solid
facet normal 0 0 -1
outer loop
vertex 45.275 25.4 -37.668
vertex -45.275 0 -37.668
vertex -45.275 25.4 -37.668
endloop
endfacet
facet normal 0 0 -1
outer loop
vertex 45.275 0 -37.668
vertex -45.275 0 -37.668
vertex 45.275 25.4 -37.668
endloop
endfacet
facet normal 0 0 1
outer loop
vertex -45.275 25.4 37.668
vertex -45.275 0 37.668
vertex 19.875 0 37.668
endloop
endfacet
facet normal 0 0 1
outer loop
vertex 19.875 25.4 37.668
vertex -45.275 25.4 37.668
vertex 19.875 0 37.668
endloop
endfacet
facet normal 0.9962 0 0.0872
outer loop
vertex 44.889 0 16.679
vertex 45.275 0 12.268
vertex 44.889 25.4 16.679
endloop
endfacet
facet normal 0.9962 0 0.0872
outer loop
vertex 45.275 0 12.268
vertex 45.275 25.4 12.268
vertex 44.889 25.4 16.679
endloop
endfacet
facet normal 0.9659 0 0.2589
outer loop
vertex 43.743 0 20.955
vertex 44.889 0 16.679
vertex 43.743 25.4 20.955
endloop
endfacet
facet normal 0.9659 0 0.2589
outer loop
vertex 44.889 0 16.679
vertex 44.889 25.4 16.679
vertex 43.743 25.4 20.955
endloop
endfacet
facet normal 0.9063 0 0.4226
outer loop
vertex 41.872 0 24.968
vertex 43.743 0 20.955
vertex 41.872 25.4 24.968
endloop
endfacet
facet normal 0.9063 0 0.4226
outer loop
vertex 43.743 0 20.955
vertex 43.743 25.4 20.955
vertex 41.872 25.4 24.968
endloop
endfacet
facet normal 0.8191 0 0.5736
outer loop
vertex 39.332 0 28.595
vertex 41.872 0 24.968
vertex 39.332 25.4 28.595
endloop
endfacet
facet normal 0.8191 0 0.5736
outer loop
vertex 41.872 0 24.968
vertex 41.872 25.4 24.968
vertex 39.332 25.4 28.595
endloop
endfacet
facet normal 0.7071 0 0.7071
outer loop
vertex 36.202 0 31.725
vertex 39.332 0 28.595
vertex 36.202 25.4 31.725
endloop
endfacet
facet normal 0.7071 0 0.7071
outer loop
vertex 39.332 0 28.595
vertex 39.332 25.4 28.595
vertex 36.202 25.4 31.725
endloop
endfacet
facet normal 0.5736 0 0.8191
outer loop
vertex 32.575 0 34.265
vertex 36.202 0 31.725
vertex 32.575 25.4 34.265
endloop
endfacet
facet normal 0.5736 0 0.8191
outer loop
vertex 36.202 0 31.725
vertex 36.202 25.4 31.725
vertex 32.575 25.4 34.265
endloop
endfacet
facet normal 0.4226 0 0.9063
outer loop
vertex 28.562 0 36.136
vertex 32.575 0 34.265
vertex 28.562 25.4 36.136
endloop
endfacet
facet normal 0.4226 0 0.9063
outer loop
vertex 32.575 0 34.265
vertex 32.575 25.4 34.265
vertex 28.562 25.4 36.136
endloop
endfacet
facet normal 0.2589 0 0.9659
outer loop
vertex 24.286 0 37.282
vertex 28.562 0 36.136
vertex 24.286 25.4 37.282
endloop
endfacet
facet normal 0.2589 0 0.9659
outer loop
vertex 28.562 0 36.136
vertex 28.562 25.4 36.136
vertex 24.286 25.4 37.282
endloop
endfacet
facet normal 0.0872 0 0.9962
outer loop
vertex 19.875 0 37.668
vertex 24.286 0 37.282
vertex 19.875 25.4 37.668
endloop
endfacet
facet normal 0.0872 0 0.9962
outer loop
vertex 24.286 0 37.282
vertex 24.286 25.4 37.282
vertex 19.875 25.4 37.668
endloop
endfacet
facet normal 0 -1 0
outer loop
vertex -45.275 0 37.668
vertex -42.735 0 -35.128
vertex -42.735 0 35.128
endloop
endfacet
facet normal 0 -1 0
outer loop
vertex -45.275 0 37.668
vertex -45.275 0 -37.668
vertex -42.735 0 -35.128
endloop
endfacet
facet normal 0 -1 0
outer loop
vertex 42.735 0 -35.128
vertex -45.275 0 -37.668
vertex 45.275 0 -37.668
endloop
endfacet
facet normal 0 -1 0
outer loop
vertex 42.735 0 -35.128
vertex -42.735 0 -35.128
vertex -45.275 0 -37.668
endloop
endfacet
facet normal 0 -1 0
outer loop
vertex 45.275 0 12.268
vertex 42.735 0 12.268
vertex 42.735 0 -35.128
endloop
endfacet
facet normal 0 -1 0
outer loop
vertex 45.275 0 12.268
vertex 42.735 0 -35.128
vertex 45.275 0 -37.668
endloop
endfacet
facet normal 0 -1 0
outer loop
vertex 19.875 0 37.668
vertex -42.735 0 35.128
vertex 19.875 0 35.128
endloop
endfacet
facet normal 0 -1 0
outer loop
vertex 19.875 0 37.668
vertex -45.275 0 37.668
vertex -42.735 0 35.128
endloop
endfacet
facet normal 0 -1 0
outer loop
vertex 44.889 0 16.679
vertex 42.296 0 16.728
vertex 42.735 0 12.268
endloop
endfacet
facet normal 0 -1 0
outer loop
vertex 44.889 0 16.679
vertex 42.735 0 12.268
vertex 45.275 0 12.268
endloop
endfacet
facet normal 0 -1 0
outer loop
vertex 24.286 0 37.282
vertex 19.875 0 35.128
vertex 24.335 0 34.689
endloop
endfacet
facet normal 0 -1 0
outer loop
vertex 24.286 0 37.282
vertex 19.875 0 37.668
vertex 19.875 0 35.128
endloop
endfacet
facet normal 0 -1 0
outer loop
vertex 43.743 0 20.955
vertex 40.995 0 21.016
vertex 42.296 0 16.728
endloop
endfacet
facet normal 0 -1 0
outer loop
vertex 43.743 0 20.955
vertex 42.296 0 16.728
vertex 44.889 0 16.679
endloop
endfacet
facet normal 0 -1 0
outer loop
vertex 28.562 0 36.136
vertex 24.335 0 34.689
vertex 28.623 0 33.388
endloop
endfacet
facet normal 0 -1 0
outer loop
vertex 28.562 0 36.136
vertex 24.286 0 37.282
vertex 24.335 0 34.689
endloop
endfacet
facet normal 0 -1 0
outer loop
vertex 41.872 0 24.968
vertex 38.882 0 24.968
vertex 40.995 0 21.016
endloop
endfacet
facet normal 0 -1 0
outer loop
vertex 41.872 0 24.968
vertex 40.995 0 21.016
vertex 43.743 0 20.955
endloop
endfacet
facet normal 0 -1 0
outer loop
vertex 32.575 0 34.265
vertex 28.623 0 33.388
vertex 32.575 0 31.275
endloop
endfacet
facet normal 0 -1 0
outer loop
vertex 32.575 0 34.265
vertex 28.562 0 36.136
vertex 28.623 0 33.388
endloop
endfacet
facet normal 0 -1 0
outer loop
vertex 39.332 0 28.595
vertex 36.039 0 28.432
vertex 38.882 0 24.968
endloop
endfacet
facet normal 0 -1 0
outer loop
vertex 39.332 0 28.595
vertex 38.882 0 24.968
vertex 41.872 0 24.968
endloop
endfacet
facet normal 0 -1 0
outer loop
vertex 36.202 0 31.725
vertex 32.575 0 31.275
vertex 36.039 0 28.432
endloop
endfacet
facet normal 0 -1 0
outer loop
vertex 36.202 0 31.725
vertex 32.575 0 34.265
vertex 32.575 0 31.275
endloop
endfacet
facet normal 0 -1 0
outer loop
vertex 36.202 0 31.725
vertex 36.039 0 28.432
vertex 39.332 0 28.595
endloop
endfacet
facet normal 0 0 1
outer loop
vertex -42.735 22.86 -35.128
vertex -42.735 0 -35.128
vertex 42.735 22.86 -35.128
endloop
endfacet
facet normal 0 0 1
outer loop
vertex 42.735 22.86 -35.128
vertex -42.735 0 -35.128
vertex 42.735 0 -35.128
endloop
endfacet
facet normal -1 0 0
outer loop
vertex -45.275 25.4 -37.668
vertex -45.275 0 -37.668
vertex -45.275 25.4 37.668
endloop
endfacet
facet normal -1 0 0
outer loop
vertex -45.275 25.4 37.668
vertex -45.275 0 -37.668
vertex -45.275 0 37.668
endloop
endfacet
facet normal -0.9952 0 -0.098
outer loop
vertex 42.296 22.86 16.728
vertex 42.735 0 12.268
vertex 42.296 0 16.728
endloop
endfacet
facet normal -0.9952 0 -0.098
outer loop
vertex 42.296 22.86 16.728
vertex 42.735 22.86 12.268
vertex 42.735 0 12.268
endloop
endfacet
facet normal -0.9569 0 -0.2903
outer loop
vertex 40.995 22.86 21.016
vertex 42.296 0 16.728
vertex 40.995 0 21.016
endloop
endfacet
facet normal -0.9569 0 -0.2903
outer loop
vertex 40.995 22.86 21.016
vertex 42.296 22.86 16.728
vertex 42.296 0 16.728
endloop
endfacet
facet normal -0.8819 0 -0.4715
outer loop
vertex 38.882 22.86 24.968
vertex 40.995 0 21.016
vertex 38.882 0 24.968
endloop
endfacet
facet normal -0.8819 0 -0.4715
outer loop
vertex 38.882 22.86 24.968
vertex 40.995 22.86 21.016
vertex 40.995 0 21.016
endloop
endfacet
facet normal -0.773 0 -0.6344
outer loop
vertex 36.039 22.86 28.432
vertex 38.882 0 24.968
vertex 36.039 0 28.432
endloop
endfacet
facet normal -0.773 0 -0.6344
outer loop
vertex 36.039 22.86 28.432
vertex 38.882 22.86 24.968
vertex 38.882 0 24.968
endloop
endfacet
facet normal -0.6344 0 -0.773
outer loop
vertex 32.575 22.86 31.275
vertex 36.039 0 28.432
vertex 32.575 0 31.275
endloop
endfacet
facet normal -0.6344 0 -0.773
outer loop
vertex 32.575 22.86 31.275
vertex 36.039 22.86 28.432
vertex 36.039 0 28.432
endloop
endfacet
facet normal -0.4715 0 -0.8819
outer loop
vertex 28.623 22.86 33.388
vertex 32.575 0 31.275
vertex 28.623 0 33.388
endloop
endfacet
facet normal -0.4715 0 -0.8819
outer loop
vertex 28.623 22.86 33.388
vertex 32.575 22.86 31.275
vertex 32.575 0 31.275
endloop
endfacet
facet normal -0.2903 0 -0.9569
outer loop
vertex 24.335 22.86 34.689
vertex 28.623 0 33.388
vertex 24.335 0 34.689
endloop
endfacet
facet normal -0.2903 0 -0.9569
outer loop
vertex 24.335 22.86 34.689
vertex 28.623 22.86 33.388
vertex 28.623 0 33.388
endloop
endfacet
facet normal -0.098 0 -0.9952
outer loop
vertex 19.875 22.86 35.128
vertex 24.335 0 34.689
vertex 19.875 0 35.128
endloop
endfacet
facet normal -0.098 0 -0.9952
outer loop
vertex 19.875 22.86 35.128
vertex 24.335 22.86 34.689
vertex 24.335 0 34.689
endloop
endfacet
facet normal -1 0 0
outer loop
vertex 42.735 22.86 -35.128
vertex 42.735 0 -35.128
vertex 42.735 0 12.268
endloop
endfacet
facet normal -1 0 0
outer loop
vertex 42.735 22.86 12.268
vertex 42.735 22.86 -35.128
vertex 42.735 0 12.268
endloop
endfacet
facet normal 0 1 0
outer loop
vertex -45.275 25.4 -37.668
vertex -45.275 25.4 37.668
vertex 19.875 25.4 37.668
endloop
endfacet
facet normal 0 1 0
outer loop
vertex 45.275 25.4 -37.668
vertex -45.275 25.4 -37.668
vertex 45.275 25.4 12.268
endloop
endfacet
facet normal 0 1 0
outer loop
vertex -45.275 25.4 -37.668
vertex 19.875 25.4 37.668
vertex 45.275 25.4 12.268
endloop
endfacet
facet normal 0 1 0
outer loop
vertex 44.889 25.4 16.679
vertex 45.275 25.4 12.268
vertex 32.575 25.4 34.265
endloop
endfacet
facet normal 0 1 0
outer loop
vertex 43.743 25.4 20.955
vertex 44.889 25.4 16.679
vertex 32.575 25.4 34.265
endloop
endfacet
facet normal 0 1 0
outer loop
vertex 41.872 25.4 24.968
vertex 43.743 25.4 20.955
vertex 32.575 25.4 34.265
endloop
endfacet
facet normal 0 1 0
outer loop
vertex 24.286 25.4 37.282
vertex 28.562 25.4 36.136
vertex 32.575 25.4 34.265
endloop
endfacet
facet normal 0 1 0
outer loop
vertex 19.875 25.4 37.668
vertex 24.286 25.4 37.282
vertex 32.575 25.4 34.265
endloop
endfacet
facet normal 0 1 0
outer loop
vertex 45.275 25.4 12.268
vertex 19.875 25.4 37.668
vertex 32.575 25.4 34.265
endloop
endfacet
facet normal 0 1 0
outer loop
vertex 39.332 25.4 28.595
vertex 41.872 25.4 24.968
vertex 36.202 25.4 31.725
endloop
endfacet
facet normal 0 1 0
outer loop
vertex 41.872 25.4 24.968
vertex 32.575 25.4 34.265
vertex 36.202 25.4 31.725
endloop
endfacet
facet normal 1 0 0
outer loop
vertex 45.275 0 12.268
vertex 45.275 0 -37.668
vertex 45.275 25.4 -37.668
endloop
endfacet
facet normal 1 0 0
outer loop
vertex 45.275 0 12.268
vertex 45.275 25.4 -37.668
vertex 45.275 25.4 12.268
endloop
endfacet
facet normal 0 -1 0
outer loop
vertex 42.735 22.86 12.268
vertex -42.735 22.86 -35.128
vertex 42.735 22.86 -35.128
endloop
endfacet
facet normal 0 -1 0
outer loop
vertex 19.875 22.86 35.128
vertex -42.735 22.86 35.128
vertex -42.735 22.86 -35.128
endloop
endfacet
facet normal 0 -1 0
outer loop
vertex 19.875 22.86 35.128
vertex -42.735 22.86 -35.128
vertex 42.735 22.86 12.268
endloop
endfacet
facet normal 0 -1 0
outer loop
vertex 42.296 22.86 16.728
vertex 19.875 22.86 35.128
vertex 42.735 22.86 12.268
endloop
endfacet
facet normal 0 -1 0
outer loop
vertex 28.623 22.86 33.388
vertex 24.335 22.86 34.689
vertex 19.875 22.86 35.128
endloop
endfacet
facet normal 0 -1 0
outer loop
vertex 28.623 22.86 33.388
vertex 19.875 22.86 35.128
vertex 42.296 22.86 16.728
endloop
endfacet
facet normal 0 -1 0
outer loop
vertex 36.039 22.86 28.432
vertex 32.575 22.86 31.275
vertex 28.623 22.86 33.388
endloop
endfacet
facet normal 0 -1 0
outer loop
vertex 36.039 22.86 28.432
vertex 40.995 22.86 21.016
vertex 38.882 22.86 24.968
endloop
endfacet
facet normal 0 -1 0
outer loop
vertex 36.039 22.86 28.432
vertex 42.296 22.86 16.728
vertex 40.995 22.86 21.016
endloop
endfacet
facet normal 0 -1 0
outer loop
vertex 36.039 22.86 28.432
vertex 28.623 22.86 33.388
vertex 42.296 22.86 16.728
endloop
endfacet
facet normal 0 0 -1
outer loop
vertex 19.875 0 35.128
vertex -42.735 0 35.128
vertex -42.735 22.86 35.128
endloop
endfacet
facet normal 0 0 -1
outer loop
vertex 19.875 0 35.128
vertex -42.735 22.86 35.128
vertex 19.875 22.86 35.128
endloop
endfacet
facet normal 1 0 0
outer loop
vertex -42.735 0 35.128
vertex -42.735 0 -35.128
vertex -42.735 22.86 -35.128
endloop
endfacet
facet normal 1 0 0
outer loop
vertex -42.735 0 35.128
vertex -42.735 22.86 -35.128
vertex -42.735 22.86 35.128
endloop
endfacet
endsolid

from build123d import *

# Parameters (mm, degrees)
F0_W     = 90.549692
F0_H     = 75.335876
F1_DEPTH = 25.4
F2_R     = 25.4
F3_T     = -2.54


with BuildPart() as f1:
    # F0 (on Front) → F1 (new body)
    with BuildSketch(Plane.XZ):
        Rectangle(F0_W, F0_H)
    extrude(amount=-F1_DEPTH)

    # F2
    f2_edges = [f1.edges().sort_by_distance(p)[0] for p in [
        (45.274846, 12.7, 37.667938),
    ]]
    fillet(f2_edges, radius=F2_R)

    # F3
    f3_openings = [f1.faces().sort_by_distance(p)[0] for p in [
        (-0.820402, 0, -0.662813),
    ]]
    offset(amount=F3_T, openings=f3_openings)


solid = f1.part
